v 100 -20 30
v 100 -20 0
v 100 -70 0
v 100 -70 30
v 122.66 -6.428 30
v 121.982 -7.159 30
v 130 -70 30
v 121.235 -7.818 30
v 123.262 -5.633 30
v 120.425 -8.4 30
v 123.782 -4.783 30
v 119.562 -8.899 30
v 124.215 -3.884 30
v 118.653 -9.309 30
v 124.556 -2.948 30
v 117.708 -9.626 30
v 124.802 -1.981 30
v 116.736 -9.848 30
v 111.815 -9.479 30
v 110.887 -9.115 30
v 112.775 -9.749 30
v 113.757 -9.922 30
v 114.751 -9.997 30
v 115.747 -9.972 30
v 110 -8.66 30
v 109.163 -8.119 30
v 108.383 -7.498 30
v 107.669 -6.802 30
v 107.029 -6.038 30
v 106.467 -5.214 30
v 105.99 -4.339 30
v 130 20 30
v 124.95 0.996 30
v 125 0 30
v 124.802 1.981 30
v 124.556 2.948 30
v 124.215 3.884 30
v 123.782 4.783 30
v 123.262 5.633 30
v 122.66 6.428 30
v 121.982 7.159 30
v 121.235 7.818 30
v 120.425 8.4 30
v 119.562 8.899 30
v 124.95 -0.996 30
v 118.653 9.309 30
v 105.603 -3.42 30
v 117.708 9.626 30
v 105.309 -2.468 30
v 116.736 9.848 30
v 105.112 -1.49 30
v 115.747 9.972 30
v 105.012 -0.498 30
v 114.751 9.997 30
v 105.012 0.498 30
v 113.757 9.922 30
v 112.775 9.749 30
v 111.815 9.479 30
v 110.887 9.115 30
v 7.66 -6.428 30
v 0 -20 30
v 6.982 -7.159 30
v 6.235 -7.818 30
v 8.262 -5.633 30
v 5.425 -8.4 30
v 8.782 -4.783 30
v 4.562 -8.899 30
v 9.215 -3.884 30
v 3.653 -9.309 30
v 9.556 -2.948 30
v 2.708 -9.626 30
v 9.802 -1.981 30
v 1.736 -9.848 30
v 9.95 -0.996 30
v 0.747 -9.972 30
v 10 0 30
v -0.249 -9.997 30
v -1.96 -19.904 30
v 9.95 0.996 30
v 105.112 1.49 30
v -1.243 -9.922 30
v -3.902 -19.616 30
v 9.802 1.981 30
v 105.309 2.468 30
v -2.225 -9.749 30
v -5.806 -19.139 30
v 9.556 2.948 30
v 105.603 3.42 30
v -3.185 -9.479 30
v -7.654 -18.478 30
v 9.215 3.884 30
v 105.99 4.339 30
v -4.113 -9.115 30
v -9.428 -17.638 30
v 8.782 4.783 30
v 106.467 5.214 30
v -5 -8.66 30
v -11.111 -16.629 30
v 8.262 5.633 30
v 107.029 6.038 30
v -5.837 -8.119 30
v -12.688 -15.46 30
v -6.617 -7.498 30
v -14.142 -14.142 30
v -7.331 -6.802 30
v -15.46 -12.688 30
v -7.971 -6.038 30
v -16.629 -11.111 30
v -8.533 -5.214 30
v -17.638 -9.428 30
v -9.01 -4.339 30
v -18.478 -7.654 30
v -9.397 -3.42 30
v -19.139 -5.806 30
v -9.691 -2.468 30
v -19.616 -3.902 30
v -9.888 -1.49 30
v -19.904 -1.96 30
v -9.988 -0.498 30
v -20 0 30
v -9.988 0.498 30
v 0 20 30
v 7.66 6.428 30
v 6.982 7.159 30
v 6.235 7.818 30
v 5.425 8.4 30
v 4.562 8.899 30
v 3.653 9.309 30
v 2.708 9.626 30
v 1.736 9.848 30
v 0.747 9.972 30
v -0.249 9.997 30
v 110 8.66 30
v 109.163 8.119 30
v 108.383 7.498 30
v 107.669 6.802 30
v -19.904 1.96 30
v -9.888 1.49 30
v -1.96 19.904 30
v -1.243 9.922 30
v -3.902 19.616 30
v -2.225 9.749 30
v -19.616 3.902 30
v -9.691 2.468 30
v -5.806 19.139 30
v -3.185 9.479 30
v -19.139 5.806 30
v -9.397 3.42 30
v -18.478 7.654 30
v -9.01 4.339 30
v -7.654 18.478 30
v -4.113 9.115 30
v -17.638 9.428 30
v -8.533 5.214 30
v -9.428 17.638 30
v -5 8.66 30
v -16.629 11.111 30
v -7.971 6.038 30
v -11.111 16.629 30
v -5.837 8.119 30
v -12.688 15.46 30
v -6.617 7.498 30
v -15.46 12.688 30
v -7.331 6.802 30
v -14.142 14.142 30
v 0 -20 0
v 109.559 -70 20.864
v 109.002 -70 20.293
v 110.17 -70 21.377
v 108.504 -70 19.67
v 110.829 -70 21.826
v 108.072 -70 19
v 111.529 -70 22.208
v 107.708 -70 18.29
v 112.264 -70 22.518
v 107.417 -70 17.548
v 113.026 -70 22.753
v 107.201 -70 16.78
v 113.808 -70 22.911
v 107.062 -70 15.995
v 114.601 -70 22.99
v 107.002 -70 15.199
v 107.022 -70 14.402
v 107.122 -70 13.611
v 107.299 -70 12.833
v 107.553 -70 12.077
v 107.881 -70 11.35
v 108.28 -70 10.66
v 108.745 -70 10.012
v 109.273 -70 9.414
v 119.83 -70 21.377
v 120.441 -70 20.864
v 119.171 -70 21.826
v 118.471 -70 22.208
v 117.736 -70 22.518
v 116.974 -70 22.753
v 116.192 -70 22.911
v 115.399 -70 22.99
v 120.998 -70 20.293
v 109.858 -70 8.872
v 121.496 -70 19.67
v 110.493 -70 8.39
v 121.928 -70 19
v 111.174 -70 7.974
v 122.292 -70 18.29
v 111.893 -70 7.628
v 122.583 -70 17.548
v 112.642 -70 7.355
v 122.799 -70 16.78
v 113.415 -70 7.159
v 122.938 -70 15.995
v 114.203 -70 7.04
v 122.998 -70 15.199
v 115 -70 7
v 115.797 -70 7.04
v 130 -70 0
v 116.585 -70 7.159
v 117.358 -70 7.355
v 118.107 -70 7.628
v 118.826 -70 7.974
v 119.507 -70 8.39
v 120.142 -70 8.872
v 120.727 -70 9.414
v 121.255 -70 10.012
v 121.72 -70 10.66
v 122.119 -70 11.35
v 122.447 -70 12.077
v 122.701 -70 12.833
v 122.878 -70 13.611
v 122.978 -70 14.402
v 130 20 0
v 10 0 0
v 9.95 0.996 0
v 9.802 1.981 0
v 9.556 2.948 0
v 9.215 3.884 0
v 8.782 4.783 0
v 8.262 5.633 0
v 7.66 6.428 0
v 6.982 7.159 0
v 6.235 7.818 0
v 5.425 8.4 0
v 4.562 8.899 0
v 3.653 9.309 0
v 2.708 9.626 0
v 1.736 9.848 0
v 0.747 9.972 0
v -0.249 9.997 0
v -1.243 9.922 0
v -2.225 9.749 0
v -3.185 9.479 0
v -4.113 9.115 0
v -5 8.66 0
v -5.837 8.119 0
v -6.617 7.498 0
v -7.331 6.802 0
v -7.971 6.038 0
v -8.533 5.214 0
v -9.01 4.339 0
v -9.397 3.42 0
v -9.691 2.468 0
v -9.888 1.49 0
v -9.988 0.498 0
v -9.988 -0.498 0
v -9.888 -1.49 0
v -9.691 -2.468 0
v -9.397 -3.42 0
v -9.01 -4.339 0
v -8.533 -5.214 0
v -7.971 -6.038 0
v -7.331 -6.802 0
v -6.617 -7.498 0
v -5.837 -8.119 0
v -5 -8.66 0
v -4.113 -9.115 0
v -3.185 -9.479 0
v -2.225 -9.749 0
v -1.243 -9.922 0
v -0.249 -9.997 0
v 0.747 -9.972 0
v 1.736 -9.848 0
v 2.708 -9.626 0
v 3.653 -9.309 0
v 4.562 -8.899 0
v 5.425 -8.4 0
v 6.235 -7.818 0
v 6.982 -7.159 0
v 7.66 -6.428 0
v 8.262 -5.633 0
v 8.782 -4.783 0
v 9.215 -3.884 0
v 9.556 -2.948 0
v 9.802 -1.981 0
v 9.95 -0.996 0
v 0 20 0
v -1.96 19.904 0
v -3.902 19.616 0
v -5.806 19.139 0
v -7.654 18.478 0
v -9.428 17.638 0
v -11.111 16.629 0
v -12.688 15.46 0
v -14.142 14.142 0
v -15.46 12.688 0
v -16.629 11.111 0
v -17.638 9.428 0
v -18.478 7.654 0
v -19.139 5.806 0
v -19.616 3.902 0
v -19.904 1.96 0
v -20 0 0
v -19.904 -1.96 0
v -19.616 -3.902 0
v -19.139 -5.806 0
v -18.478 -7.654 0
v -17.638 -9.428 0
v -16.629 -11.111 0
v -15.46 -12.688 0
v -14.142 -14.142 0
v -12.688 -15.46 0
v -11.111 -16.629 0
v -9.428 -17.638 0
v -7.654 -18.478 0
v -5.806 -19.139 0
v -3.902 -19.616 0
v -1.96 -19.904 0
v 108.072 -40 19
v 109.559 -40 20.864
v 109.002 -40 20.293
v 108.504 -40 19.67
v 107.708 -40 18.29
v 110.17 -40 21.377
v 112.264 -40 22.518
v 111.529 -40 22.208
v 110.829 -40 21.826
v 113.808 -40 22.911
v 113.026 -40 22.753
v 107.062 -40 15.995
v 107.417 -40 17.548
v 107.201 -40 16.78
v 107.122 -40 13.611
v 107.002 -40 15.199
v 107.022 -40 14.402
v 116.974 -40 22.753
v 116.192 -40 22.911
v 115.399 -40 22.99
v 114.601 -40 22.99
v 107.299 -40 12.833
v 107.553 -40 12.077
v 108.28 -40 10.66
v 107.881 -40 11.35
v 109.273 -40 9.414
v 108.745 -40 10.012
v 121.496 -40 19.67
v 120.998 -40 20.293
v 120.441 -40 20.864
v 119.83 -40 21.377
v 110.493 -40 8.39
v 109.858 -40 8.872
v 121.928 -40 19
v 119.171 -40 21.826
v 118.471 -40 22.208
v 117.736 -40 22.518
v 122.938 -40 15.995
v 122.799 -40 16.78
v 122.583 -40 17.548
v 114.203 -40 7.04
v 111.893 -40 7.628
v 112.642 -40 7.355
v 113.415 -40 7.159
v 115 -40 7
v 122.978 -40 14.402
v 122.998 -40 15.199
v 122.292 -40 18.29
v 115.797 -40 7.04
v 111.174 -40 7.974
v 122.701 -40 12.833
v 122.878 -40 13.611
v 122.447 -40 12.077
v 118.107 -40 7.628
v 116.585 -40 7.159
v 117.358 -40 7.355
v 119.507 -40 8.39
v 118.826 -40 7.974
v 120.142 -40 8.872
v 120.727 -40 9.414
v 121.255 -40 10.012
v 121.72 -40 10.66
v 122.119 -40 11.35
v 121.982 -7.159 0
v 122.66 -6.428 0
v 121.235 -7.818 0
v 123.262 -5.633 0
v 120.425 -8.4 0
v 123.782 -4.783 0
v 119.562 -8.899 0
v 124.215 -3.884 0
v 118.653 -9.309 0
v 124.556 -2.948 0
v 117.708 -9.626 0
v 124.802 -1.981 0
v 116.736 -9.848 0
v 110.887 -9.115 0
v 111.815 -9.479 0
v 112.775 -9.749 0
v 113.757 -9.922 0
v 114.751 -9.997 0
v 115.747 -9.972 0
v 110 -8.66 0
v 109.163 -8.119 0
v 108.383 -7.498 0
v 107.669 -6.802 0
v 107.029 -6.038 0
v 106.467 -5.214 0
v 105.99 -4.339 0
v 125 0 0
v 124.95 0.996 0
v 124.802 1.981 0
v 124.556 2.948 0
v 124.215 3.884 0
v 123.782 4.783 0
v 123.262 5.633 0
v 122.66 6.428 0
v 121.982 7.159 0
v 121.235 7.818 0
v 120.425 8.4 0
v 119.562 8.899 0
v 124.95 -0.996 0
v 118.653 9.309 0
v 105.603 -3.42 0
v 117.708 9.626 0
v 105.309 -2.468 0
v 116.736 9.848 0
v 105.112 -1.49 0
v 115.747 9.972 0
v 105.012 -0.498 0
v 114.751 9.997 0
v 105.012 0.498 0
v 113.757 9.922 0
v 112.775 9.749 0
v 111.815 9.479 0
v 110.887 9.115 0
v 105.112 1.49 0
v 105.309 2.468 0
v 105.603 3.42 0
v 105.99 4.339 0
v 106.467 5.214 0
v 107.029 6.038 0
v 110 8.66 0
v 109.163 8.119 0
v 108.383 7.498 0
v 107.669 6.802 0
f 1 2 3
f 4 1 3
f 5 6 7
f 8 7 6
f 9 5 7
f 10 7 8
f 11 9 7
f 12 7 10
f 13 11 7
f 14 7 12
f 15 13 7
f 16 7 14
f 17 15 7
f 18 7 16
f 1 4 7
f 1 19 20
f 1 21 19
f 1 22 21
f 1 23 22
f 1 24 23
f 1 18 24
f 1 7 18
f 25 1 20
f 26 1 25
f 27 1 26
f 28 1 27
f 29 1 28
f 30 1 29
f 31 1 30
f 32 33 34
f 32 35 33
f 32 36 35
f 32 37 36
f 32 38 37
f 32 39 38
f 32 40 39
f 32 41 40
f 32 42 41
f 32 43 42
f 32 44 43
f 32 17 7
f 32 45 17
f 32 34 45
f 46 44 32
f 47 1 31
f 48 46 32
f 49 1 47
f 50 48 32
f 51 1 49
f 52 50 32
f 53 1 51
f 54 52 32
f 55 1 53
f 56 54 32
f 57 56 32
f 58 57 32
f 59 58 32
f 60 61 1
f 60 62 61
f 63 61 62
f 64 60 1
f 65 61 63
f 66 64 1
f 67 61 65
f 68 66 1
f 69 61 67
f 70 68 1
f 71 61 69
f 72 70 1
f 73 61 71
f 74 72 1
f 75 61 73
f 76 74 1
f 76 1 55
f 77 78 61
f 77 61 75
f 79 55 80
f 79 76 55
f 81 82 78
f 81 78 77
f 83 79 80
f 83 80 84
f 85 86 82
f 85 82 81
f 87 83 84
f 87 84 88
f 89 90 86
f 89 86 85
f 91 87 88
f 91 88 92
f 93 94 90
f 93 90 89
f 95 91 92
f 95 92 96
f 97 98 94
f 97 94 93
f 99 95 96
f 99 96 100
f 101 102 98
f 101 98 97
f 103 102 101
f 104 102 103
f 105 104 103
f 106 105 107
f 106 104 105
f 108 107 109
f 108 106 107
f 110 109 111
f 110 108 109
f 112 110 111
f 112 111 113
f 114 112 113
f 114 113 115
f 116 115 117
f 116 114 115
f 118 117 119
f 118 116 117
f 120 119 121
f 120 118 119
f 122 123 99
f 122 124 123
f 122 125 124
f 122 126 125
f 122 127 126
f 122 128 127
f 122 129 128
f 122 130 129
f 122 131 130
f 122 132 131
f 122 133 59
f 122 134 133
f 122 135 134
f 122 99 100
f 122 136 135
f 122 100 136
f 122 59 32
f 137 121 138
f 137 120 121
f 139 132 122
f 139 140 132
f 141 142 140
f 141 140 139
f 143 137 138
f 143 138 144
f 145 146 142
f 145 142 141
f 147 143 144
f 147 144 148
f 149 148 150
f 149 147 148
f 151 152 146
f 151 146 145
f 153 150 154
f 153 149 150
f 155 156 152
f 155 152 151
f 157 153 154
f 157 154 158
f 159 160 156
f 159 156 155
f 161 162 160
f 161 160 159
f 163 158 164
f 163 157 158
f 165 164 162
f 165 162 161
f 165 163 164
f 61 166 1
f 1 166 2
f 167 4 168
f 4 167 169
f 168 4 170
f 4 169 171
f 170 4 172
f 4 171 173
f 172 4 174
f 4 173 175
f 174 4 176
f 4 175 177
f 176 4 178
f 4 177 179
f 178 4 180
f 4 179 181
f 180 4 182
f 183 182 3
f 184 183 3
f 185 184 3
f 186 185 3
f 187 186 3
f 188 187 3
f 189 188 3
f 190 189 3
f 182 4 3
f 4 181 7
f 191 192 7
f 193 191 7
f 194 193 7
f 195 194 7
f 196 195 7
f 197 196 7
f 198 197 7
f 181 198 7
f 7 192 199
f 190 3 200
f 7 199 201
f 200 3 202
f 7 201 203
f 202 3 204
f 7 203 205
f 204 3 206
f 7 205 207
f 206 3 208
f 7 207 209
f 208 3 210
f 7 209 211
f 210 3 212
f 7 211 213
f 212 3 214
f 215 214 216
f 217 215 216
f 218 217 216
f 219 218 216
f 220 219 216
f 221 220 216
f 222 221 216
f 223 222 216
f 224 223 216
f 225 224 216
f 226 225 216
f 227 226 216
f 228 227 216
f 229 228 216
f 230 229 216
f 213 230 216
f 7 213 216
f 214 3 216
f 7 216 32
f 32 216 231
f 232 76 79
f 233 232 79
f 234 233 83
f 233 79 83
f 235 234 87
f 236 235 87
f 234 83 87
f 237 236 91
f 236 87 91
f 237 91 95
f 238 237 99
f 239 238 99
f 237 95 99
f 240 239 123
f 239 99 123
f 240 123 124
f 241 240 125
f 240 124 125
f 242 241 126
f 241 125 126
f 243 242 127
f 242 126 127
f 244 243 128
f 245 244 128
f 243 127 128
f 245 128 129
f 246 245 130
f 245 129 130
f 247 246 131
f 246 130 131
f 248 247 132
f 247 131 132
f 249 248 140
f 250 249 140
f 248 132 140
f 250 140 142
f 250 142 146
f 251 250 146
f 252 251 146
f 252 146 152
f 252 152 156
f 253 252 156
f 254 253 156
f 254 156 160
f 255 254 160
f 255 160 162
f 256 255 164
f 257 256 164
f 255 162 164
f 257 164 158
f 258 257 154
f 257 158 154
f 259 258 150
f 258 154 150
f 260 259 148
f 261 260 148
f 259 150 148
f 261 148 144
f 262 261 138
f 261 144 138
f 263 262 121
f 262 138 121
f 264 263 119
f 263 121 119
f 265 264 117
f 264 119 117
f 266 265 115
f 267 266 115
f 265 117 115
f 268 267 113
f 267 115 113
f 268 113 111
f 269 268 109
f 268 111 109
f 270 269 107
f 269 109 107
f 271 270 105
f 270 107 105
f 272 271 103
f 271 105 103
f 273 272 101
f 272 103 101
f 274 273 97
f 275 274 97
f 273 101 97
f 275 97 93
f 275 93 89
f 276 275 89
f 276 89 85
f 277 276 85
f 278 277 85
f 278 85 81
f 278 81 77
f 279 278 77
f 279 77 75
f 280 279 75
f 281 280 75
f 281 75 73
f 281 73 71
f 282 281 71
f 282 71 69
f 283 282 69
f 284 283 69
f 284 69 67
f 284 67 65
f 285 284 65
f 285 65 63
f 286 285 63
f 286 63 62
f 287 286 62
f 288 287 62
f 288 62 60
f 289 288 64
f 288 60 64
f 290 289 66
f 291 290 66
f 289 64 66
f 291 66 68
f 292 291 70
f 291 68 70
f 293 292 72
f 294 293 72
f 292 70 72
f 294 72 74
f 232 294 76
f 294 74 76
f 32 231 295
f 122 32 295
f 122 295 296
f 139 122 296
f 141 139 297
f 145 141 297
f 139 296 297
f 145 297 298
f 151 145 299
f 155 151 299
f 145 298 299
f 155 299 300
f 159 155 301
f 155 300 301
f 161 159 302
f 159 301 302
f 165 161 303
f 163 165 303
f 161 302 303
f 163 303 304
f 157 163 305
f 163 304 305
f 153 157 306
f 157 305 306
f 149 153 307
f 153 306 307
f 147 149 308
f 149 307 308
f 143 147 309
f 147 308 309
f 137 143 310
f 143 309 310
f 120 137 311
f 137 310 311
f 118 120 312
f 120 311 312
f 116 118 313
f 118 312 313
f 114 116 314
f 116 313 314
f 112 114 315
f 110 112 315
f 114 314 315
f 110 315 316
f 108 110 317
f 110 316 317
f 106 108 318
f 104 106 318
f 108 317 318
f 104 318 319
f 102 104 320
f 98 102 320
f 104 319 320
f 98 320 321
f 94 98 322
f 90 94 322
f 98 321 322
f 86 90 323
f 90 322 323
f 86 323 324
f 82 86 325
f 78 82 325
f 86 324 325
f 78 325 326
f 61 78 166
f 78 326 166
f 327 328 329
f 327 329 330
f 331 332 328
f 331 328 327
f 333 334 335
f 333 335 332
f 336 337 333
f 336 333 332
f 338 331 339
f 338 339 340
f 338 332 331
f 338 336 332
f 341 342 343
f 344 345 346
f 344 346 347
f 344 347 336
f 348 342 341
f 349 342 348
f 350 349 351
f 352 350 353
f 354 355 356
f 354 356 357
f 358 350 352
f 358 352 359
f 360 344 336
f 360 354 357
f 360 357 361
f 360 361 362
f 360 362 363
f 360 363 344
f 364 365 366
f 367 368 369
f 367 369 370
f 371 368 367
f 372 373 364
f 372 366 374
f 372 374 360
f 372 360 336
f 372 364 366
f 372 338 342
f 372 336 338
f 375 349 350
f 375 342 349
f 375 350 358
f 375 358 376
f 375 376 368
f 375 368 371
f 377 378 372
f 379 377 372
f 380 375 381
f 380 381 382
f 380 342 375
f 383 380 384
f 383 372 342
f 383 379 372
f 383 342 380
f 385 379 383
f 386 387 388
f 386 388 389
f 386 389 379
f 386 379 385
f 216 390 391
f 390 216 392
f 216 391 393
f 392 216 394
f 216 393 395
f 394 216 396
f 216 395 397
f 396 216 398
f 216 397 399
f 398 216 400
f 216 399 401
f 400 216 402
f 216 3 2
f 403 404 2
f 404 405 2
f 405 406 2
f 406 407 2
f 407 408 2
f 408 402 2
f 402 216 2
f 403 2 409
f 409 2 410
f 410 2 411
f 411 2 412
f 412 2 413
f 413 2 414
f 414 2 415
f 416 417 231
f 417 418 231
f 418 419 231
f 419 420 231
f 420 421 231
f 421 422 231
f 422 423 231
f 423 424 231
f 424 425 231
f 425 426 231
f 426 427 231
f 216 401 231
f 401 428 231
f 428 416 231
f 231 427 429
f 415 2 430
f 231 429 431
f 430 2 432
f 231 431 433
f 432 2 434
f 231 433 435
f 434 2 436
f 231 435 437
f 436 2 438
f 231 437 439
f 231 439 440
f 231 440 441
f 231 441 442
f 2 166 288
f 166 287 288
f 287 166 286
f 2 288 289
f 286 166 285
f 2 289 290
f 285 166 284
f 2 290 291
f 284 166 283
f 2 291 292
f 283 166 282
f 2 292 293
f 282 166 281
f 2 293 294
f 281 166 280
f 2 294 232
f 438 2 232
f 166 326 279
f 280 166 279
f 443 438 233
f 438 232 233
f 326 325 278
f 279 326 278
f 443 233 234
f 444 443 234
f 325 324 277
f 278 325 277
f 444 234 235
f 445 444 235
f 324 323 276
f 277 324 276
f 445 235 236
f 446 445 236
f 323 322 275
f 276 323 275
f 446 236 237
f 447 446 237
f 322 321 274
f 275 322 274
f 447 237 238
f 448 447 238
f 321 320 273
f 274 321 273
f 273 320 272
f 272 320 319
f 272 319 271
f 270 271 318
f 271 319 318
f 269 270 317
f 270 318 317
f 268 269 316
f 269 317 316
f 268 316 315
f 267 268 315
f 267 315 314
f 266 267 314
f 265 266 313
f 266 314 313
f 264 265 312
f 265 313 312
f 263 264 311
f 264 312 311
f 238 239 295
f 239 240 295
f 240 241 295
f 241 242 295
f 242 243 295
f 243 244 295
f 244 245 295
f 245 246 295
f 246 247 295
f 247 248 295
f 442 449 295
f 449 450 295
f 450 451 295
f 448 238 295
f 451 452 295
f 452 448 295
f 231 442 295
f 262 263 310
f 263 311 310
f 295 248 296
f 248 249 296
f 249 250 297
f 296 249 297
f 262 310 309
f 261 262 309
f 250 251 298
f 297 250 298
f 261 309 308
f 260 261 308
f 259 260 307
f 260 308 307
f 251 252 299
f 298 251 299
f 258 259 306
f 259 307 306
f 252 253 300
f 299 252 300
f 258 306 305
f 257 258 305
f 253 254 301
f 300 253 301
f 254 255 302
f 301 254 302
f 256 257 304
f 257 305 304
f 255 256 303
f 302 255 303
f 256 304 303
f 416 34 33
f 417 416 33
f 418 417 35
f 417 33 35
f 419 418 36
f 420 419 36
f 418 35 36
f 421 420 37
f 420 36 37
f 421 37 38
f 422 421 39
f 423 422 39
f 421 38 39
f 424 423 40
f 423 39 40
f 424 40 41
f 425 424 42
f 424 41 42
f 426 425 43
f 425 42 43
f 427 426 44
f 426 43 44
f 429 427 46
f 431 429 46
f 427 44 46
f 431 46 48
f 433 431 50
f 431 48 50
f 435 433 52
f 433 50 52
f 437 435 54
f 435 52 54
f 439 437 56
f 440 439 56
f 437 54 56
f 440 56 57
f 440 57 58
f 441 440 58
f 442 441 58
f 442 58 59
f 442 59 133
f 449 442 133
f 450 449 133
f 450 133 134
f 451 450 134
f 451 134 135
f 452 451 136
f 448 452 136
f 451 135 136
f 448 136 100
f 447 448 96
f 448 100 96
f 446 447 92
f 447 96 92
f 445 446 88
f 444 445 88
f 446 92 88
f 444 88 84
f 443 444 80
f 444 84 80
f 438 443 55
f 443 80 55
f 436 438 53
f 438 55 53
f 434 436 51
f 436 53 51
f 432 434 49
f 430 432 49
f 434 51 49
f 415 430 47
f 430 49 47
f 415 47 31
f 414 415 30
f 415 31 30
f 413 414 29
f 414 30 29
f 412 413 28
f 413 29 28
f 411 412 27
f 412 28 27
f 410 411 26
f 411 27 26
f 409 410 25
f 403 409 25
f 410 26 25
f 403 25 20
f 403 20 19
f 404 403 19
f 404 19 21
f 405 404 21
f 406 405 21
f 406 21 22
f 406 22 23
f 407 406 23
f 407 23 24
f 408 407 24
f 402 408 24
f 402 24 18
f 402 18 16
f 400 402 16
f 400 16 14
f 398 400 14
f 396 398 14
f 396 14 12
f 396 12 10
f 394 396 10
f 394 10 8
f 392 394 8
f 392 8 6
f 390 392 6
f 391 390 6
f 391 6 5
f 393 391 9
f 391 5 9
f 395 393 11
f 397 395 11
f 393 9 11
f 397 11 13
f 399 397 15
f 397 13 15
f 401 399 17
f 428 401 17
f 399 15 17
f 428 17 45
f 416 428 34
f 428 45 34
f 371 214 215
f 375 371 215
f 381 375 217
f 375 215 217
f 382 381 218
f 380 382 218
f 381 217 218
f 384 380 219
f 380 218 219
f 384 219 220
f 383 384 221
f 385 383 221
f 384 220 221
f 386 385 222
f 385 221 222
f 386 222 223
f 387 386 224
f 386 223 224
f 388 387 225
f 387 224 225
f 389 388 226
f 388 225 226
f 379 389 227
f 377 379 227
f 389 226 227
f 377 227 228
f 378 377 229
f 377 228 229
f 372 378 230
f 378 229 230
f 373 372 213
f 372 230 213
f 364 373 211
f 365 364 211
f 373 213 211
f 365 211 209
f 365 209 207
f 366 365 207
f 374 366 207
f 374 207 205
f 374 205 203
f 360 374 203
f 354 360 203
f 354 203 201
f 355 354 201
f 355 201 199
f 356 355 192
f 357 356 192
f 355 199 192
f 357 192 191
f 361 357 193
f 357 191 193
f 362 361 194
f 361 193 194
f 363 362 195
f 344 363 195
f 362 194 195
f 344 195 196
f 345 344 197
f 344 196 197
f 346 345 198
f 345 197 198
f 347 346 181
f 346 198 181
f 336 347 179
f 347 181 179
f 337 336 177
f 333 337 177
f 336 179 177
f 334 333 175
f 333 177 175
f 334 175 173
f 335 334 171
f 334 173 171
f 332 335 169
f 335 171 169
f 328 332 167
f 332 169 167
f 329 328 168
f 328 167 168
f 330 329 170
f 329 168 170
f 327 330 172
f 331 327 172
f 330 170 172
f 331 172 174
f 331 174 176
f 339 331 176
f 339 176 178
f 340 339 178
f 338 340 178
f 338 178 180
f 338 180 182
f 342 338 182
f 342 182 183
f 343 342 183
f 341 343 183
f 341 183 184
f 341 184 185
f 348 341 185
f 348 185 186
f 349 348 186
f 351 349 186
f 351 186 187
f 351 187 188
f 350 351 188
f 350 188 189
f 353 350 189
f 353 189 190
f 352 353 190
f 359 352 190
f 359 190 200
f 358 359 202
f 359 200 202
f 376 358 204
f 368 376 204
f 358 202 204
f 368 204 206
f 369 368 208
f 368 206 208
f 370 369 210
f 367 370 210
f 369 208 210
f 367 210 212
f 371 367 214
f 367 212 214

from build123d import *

# Parameters (mm, degrees)
BOSS_EXTRUDE1_DEPTH = 30
SKETCH2_R           = 8
CUT_EXTRUDE1_DEPTH  = 30
SKETCH3_R           = 10
CUT_EXTRUDE2_DEPTH  = 30


with BuildPart() as part:
    # Sketch1 → Boss-Extrude1 (new body)
    with BuildSketch(Plane(origin=(0, 0, 0), x_dir=(0, 1, 0), z_dir=(0, 0, 1))):
        with BuildLine():
            Line((-20, 0), (-20, -100))
            Line((-20, -100), (-70, -100))
            Line((-70, -100), (-70, -130))
            Line((-70, -130), (20, -130))
            Line((20, -130), (20, 0))
            ThreePointArc((20, 0), (0, 20), (-20, 0))
        make_face()
    extrude(amount=BOSS_EXTRUDE1_DEPTH)

    # Sketch2 → Cut-Extrude1 (cut)
    with BuildSketch(Plane.XZ.offset(70)):
        with Locations(Location((115, 15, 0), (0, 0, 270))):
            Circle(SKETCH2_R)
    extrude(amount=-CUT_EXTRUDE1_DEPTH, mode=Mode.SUBTRACT)

    # Sketch3 → Cut-Extrude2 (cut)
    with BuildSketch(Plane.XY.offset(30)):
        Circle(SKETCH3_R)
        with Locations((115, 0)):
            Circle(SKETCH3_R)
    extrude(amount=-CUT_EXTRUDE2_DEPTH, mode=Mode.SUBTRACT)


solid = part.part
